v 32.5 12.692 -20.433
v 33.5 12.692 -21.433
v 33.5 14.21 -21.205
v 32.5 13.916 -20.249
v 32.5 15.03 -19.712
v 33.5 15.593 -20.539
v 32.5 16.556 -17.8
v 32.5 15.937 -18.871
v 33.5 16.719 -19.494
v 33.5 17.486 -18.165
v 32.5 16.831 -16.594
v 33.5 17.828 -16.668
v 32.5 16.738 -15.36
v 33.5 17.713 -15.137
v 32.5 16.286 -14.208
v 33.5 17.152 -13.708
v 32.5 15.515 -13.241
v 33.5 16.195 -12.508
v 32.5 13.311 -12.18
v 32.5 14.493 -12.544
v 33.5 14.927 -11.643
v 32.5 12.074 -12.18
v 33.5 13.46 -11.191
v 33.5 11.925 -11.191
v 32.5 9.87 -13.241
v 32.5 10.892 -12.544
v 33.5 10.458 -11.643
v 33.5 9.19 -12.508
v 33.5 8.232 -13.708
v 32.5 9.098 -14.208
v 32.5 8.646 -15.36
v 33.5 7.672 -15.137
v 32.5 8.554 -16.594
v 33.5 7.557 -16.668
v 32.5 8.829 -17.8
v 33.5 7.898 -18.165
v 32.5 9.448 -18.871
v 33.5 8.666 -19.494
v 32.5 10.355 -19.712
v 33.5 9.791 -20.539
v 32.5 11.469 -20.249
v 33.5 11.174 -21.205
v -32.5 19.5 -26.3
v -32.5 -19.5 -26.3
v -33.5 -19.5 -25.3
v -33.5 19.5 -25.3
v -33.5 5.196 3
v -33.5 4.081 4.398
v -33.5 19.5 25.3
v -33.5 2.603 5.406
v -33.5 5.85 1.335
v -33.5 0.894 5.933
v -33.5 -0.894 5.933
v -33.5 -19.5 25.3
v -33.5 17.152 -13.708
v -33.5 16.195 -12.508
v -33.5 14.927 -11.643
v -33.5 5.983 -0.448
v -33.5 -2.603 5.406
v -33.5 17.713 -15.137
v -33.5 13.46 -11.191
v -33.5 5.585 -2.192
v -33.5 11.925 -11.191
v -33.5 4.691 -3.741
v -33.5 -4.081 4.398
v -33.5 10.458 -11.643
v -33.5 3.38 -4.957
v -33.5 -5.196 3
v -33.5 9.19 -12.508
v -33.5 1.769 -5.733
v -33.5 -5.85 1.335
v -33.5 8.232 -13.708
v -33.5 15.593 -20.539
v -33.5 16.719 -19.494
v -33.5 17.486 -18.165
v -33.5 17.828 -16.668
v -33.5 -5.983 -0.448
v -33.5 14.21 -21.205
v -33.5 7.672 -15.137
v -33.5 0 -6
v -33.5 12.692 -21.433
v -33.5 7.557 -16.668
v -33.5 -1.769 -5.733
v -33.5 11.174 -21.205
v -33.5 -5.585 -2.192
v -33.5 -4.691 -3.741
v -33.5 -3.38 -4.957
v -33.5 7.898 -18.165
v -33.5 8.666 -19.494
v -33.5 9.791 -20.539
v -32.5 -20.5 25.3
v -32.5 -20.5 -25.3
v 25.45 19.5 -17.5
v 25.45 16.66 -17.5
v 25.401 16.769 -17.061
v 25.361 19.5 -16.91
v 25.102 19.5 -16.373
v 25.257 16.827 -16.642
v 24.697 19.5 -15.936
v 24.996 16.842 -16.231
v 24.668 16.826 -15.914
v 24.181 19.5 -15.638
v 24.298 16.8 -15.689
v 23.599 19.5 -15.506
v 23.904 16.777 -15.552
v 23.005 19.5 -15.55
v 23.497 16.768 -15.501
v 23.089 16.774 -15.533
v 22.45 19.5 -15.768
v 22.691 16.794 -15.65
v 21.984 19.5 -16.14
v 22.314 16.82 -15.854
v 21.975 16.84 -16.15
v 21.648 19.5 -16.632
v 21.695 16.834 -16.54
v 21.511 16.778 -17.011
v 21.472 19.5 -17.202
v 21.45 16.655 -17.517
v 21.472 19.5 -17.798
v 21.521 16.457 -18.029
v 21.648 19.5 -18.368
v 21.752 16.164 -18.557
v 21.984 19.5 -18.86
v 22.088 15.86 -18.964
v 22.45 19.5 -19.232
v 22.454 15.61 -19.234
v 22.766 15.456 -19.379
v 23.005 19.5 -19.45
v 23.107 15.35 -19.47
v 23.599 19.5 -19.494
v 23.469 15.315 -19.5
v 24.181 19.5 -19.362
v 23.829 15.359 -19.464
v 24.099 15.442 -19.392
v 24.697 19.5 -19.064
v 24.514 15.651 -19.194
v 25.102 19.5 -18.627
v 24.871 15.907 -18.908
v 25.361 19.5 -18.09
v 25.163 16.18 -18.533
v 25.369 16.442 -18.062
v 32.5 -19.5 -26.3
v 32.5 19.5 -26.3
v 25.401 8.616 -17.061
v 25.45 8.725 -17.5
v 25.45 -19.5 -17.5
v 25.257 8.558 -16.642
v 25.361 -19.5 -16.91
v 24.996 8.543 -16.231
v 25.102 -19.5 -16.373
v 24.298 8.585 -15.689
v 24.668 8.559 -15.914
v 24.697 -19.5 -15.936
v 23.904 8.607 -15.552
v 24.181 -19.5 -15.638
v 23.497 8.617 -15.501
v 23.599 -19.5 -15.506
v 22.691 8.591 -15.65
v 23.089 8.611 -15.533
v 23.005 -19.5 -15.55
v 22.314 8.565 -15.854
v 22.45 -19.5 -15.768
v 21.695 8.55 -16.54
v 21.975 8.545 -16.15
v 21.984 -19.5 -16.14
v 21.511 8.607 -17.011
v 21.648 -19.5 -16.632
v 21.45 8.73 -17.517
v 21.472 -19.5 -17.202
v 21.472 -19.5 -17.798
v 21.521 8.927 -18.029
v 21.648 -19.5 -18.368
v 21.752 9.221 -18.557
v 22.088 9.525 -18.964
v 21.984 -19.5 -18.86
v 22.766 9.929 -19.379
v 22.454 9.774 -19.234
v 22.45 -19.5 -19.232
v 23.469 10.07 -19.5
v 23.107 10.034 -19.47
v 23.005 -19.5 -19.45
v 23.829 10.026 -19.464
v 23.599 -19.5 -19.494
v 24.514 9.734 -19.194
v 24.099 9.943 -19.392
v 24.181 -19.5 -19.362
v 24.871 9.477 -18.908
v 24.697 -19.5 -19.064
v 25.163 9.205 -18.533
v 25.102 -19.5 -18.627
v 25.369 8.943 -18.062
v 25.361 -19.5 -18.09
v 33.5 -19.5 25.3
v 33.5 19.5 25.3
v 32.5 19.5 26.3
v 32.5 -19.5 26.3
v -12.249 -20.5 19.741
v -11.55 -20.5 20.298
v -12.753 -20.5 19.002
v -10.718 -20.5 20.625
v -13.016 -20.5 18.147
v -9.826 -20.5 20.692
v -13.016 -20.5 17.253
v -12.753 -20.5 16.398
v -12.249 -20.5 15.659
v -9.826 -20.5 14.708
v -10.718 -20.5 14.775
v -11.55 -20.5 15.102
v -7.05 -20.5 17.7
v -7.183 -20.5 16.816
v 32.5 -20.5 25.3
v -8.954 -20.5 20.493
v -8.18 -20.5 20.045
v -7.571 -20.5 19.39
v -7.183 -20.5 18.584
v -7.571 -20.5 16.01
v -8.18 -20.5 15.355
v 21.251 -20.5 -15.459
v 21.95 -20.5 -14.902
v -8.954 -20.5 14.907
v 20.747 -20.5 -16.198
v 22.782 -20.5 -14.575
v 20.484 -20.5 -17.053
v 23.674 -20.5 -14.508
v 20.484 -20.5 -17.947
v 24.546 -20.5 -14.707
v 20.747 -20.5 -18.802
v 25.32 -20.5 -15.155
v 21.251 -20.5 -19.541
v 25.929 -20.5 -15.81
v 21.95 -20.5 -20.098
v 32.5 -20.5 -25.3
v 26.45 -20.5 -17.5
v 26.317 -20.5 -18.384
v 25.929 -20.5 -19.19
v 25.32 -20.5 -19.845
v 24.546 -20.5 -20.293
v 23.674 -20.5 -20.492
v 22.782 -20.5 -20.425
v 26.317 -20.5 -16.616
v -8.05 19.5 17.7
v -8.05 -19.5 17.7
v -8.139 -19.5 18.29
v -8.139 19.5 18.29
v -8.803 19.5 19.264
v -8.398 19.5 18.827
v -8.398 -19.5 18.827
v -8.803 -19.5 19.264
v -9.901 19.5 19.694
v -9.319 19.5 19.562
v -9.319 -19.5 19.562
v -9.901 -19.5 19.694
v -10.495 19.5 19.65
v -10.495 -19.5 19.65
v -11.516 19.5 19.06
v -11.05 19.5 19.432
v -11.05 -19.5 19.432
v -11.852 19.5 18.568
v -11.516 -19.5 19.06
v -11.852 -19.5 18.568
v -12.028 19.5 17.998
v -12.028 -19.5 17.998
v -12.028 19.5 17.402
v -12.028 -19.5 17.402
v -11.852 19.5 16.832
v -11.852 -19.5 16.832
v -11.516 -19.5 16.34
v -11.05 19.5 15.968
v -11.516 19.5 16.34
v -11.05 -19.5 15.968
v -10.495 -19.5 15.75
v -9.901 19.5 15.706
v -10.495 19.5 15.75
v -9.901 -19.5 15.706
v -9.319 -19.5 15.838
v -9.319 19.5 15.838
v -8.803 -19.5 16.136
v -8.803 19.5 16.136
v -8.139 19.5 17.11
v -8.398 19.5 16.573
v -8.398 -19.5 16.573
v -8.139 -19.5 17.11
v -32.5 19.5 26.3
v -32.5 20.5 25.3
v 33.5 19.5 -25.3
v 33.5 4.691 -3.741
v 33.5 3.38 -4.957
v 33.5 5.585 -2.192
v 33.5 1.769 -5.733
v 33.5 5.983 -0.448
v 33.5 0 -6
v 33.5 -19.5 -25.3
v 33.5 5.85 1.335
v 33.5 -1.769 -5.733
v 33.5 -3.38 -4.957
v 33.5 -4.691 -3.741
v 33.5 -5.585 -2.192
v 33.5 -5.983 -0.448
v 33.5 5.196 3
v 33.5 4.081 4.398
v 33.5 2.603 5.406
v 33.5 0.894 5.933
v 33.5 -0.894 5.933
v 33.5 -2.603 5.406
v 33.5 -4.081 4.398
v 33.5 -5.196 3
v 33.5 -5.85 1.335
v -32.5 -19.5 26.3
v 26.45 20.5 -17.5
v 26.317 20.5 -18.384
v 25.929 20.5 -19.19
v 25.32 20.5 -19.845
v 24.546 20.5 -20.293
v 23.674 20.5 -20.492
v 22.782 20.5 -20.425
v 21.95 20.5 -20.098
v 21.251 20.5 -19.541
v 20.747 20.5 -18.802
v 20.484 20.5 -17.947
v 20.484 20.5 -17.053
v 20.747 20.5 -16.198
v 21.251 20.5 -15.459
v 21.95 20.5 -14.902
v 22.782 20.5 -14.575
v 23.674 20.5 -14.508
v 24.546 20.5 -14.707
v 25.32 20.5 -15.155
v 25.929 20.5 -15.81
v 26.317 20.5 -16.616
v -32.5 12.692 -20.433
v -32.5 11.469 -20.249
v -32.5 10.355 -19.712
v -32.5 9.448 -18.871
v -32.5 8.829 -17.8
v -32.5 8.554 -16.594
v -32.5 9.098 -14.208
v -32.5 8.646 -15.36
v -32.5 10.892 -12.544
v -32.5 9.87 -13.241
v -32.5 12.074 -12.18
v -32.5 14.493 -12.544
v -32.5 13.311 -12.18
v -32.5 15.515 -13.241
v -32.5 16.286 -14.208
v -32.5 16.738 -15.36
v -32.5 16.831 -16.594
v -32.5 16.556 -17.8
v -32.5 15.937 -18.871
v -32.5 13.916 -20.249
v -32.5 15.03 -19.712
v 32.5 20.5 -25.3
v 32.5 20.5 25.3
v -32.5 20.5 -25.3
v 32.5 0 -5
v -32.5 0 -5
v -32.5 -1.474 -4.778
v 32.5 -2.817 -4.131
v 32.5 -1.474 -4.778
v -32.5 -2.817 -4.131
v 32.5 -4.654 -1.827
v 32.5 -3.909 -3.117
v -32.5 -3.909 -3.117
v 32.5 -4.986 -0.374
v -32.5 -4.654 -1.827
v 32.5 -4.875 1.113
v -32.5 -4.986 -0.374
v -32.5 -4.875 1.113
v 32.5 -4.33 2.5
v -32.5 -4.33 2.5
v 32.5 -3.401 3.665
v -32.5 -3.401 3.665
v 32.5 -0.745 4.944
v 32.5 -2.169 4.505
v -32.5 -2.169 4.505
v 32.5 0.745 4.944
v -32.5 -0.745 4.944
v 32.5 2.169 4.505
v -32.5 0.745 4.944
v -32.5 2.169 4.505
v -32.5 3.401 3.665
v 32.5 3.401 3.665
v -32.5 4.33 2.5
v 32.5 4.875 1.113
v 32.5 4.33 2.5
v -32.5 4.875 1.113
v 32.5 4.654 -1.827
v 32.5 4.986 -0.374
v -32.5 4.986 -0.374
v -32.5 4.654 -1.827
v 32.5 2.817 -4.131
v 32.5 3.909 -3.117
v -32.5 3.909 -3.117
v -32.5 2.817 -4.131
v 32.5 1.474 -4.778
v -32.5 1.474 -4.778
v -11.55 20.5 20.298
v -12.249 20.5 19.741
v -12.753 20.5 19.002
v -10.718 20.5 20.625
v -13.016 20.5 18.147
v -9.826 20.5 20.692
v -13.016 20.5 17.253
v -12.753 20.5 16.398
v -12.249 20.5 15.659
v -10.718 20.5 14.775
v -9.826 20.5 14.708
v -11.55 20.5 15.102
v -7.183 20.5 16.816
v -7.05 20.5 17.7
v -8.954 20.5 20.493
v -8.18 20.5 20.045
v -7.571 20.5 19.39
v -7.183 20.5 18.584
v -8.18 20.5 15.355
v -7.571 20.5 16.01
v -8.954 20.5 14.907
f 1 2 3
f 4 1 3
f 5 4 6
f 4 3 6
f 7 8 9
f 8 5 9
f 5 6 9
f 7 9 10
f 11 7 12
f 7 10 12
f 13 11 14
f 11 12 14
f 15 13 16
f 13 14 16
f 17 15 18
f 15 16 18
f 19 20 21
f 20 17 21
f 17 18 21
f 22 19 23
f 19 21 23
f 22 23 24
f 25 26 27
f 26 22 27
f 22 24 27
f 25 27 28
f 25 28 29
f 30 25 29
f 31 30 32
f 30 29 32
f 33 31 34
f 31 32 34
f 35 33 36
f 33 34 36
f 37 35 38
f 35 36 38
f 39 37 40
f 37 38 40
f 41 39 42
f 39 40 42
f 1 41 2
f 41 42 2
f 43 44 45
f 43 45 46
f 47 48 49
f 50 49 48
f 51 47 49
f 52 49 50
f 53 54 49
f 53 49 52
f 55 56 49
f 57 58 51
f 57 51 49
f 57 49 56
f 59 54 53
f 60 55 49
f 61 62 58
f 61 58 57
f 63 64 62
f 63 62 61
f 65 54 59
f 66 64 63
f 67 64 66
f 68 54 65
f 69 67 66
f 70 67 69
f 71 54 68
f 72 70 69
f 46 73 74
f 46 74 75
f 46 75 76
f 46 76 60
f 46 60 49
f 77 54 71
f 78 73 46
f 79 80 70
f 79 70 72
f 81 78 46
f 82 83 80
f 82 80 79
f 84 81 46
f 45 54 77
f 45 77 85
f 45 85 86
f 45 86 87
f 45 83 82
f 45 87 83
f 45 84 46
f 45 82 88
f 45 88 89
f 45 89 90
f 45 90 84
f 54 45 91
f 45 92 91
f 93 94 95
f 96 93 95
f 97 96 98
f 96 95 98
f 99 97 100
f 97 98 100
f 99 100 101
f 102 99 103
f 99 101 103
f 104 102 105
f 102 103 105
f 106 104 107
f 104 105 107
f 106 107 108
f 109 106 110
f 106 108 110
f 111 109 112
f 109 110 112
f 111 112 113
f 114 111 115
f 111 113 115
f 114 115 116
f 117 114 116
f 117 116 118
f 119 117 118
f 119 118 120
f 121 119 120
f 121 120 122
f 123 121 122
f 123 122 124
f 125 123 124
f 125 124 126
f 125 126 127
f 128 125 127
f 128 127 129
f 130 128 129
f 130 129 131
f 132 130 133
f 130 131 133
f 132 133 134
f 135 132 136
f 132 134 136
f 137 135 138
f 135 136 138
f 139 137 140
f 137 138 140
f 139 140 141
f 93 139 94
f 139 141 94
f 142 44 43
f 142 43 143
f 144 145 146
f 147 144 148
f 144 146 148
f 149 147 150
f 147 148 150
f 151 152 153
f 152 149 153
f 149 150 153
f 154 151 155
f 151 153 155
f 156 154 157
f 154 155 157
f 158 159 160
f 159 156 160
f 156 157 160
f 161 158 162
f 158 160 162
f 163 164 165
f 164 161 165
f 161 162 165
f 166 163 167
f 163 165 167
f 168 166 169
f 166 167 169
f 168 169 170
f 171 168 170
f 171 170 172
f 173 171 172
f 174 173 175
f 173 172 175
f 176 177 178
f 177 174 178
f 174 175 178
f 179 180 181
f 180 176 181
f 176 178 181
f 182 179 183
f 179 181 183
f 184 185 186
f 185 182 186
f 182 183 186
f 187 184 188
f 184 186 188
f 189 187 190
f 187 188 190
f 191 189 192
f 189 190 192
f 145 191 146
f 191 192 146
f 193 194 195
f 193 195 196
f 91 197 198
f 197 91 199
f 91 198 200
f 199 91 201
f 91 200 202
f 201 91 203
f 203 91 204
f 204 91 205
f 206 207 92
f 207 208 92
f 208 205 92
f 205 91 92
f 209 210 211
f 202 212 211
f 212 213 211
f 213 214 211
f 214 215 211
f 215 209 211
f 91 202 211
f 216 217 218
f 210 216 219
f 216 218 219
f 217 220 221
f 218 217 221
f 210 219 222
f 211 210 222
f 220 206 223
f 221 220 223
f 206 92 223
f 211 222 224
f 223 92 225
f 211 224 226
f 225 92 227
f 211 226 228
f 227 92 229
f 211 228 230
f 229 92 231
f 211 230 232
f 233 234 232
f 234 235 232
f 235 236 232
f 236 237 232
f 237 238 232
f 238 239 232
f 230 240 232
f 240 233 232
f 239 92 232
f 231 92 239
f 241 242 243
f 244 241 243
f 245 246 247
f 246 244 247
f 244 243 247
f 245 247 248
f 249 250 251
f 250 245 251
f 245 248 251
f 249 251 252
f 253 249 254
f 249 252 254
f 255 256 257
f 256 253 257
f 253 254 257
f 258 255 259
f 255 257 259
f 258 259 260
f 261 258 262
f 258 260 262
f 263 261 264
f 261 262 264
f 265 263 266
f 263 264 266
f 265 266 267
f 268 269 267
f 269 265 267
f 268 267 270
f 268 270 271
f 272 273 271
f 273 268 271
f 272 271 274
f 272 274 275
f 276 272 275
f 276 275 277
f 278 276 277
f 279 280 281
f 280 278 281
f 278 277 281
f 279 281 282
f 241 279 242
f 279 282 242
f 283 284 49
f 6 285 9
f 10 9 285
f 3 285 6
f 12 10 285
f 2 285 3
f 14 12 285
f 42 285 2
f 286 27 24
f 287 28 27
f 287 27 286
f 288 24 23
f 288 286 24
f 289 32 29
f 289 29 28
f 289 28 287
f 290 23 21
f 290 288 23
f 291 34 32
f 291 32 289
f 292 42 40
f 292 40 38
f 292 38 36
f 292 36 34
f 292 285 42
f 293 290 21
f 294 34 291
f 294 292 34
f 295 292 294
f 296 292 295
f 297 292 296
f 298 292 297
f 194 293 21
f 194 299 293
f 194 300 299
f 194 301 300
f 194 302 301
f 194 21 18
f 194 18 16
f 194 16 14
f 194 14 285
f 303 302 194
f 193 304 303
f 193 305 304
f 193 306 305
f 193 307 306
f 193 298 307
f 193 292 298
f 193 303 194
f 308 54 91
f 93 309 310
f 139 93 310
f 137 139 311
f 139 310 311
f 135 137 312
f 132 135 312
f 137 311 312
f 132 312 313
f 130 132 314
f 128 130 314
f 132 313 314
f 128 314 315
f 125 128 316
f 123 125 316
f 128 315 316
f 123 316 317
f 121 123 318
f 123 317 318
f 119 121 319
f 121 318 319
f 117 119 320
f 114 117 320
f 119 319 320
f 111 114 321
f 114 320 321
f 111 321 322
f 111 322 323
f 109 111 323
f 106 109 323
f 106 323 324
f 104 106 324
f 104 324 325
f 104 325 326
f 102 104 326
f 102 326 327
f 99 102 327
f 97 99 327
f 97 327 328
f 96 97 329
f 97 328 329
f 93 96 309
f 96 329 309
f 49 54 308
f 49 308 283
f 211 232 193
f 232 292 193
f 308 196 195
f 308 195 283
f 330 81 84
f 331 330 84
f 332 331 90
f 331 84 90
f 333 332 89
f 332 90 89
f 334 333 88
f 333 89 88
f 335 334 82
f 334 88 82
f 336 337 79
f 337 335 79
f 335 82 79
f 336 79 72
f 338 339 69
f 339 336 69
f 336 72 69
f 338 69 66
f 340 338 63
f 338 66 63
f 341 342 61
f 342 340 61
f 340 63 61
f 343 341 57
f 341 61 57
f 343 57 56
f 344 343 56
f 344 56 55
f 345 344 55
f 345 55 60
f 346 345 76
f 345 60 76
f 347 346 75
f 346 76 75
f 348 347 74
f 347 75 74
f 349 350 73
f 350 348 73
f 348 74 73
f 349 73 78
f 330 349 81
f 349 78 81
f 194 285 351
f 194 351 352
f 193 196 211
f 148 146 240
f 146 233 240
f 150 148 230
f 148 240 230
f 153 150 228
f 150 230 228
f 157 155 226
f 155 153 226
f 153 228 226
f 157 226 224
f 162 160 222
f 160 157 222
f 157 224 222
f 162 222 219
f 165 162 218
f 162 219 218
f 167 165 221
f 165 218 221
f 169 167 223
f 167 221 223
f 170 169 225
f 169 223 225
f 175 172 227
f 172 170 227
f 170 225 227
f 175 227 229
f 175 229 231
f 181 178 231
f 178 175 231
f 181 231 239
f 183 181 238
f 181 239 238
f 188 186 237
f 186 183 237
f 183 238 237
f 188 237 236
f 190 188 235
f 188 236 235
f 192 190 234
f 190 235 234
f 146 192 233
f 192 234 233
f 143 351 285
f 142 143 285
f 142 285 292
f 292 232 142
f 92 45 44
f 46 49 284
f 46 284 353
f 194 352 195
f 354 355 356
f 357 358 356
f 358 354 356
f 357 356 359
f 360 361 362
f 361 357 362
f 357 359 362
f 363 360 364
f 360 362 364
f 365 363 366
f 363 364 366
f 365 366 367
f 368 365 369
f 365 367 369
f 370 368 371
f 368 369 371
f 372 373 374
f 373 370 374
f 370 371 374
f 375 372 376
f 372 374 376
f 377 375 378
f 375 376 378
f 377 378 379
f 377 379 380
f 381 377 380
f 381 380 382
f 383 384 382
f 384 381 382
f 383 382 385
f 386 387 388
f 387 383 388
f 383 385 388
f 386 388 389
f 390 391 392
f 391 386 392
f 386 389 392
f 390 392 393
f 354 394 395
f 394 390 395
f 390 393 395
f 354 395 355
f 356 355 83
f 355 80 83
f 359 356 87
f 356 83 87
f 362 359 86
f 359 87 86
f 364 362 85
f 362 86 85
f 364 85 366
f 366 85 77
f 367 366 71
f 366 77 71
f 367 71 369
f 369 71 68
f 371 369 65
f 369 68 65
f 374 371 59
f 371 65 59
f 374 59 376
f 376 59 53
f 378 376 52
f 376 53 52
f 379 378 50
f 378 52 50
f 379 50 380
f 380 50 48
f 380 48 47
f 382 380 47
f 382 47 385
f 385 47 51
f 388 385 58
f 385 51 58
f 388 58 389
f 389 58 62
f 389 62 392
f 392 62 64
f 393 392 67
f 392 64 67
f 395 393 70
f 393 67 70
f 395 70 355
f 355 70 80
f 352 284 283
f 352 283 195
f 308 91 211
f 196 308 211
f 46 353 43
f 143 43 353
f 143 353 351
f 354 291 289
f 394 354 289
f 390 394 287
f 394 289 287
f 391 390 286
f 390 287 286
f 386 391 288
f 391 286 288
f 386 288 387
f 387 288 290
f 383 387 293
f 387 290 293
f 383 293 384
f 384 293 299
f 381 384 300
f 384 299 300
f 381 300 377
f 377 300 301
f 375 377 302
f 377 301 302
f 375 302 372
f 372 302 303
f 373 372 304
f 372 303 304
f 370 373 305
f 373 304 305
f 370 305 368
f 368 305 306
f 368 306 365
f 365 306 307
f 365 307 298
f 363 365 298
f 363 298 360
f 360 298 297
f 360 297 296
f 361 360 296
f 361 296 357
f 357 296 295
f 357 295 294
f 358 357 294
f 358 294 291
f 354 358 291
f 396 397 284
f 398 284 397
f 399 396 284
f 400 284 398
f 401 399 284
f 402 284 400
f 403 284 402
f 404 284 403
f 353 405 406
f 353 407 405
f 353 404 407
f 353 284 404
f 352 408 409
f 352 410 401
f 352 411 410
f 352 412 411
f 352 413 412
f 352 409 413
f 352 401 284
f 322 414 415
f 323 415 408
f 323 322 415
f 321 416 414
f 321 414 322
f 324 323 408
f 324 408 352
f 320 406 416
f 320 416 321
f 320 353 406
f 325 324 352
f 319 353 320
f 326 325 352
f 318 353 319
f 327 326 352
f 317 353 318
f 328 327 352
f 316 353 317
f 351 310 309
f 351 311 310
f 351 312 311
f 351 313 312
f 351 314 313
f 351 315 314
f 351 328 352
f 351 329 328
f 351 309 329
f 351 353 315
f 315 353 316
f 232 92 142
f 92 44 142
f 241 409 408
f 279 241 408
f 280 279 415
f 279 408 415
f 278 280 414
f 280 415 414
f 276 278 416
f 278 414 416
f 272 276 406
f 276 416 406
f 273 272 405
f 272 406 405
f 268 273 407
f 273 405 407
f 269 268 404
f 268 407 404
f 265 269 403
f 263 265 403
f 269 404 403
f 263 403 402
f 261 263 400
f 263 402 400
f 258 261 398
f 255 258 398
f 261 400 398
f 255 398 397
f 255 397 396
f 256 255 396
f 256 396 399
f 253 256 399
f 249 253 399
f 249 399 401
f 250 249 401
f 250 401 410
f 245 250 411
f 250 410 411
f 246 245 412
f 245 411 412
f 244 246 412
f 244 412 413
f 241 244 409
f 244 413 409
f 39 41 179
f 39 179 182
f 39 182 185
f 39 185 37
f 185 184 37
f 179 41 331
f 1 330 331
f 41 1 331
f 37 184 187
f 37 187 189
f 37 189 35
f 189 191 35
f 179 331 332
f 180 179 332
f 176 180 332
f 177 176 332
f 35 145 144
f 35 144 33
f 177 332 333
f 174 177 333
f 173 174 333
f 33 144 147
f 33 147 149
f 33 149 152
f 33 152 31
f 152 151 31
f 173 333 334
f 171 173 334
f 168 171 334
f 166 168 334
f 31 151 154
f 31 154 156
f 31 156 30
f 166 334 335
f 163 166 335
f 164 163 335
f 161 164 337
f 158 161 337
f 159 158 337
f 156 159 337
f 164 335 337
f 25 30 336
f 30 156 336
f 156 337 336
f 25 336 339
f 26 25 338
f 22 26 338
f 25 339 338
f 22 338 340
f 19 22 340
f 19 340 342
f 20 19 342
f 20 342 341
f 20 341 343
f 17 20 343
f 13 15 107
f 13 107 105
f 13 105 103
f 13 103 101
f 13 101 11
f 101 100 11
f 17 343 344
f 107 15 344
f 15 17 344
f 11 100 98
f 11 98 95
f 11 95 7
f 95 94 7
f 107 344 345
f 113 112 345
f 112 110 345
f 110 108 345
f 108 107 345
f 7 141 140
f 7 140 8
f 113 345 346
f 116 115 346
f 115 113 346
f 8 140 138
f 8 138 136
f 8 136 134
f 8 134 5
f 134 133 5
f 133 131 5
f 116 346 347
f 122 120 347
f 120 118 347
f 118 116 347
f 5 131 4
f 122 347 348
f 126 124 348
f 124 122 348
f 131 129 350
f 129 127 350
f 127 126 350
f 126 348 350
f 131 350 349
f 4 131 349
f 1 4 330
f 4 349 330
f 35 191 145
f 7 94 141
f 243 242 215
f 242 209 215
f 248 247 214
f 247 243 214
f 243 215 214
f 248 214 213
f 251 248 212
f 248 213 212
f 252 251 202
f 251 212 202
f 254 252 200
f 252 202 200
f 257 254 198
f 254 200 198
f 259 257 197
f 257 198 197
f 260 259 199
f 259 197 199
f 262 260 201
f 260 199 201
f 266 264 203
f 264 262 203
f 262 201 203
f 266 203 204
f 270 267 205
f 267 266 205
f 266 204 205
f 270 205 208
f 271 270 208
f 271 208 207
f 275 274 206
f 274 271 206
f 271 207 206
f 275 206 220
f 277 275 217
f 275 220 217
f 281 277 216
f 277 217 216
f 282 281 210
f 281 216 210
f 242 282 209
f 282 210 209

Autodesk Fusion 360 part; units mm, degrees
sketch "Sketch1" plane through (0, 0, 0) normal (0, 1, 0) x (1, 0, 0) in component "WoaS Preamp Box Drilling Block"
  line L0 (33.5, -26.3) -> (-33.5, -26.3)
  line L1 (-33.5, -26.3) -> (-33.5, 26.3)
  line L2 (-33.5, 26.3) -> (33.5, 26.3)
  line L3 (33.5, 26.3) -> (33.5, -26.3)
  line L4 (33.5, -26.3) -> (-33.5, 26.3) construction
  line L5 (-33.5, -26.3) -> (33.5, 26.3) construction
  line L6 (0, 0) -> (-10.05, 0) construction
  line L7 (-10.05, 0) -> (-10.05, -17.7) construction
  line L8 (0, 0) -> (23.45, 0) construction
  line L9 (23.45, 0) -> (23.45, 17.5) construction
  circle A0 centre (23.45, 17.5) radius 2
  circle A1 centre (-10.05, -17.7) radius 2
  dimension "d1" = 67
  dimension "d2" = 52.6
  dimension "d3" = 10.05
  dimension "d4" = 17.7
  dimension "d5" = 23.45
  dimension "d6" = 17.5
  dimension "d7" = 4
  dimension "d8" = 4
sketch "Sketch2" plane through (0, 0, 0) normal (1, 0, 0) x (0, 0, -1) in component "WoaS Preamp Box Drilling Block"
  line L0 (-26.3, -20.5) -> (26.3, -20.5)
  line L1 (26.3, -20.5) -> (26.3, 20.5)
  line L2 (26.3, 20.5) -> (-26.3, 20.5)
  line L3 (-26.3, 20.5) -> (-26.3, -20.5)
  line L4 (-26.3, -20.5) -> (26.3, 20.5) construction
  line L5 (26.3, -20.5) -> (-26.3, 20.5) construction
  circle A0 centre (0, 0) radius 5
  line L6 (26.3, 20.5) -> (16.2834, 12.6924)
  circle A1 centre (16.2834, 12.6924) radius 4.15
  dimension "d9" = 52.6
  dimension "d10" = 41
  dimension "d11" = 10
  dimension "d12" = 12.7
  dimension "d13" = 8.3
extrude "Extrude1" add sketch "Sketch1" along normal mid plane 41 in component "WoaS Preamp Box Drilling Block"
extrude "Extrude2" cut sketch "Sketch2" along normal mid plane 67 contours A1 | A0 in component "WoaS Preamp Box Drilling Block"
chamfer "Chamfer1" distance 1 angle 45 6 faces at (-7.3094, 20.5, -9.2654) (-33.5, 0, 19.2) (-11.1667, 6.8333, 26.3) (-7.3094, -20.5, -9.2654) (33.5, 0, 19.2) (-11.1667, -6.8333, -26.3) in component "WoaS Preamp Box Drilling Block"
component "WoaS Preamp Box Drilling Block" placed x (1, 0, 0) y (0, 1, 0) z (0, 0, 1) at (0, 0, 0)
equation "d3 = ( 69.9 / 2 ) * 1 mm - 24.9 mm"
equation "d4 = ( 55 / 2 ) * 1 mm - 9.8 mm"
equation "d5 = ( 69.9 / 2 ) * 1 mm - 11.5 mm"
equation "d6 = ( 55 / 2 ) * 1 mm - 10 mm"
equation "d12 = ( 25.4 / 2 ) * 1 mm"
equation "d14 = ( 41 / 2 ) * 1 mm"
